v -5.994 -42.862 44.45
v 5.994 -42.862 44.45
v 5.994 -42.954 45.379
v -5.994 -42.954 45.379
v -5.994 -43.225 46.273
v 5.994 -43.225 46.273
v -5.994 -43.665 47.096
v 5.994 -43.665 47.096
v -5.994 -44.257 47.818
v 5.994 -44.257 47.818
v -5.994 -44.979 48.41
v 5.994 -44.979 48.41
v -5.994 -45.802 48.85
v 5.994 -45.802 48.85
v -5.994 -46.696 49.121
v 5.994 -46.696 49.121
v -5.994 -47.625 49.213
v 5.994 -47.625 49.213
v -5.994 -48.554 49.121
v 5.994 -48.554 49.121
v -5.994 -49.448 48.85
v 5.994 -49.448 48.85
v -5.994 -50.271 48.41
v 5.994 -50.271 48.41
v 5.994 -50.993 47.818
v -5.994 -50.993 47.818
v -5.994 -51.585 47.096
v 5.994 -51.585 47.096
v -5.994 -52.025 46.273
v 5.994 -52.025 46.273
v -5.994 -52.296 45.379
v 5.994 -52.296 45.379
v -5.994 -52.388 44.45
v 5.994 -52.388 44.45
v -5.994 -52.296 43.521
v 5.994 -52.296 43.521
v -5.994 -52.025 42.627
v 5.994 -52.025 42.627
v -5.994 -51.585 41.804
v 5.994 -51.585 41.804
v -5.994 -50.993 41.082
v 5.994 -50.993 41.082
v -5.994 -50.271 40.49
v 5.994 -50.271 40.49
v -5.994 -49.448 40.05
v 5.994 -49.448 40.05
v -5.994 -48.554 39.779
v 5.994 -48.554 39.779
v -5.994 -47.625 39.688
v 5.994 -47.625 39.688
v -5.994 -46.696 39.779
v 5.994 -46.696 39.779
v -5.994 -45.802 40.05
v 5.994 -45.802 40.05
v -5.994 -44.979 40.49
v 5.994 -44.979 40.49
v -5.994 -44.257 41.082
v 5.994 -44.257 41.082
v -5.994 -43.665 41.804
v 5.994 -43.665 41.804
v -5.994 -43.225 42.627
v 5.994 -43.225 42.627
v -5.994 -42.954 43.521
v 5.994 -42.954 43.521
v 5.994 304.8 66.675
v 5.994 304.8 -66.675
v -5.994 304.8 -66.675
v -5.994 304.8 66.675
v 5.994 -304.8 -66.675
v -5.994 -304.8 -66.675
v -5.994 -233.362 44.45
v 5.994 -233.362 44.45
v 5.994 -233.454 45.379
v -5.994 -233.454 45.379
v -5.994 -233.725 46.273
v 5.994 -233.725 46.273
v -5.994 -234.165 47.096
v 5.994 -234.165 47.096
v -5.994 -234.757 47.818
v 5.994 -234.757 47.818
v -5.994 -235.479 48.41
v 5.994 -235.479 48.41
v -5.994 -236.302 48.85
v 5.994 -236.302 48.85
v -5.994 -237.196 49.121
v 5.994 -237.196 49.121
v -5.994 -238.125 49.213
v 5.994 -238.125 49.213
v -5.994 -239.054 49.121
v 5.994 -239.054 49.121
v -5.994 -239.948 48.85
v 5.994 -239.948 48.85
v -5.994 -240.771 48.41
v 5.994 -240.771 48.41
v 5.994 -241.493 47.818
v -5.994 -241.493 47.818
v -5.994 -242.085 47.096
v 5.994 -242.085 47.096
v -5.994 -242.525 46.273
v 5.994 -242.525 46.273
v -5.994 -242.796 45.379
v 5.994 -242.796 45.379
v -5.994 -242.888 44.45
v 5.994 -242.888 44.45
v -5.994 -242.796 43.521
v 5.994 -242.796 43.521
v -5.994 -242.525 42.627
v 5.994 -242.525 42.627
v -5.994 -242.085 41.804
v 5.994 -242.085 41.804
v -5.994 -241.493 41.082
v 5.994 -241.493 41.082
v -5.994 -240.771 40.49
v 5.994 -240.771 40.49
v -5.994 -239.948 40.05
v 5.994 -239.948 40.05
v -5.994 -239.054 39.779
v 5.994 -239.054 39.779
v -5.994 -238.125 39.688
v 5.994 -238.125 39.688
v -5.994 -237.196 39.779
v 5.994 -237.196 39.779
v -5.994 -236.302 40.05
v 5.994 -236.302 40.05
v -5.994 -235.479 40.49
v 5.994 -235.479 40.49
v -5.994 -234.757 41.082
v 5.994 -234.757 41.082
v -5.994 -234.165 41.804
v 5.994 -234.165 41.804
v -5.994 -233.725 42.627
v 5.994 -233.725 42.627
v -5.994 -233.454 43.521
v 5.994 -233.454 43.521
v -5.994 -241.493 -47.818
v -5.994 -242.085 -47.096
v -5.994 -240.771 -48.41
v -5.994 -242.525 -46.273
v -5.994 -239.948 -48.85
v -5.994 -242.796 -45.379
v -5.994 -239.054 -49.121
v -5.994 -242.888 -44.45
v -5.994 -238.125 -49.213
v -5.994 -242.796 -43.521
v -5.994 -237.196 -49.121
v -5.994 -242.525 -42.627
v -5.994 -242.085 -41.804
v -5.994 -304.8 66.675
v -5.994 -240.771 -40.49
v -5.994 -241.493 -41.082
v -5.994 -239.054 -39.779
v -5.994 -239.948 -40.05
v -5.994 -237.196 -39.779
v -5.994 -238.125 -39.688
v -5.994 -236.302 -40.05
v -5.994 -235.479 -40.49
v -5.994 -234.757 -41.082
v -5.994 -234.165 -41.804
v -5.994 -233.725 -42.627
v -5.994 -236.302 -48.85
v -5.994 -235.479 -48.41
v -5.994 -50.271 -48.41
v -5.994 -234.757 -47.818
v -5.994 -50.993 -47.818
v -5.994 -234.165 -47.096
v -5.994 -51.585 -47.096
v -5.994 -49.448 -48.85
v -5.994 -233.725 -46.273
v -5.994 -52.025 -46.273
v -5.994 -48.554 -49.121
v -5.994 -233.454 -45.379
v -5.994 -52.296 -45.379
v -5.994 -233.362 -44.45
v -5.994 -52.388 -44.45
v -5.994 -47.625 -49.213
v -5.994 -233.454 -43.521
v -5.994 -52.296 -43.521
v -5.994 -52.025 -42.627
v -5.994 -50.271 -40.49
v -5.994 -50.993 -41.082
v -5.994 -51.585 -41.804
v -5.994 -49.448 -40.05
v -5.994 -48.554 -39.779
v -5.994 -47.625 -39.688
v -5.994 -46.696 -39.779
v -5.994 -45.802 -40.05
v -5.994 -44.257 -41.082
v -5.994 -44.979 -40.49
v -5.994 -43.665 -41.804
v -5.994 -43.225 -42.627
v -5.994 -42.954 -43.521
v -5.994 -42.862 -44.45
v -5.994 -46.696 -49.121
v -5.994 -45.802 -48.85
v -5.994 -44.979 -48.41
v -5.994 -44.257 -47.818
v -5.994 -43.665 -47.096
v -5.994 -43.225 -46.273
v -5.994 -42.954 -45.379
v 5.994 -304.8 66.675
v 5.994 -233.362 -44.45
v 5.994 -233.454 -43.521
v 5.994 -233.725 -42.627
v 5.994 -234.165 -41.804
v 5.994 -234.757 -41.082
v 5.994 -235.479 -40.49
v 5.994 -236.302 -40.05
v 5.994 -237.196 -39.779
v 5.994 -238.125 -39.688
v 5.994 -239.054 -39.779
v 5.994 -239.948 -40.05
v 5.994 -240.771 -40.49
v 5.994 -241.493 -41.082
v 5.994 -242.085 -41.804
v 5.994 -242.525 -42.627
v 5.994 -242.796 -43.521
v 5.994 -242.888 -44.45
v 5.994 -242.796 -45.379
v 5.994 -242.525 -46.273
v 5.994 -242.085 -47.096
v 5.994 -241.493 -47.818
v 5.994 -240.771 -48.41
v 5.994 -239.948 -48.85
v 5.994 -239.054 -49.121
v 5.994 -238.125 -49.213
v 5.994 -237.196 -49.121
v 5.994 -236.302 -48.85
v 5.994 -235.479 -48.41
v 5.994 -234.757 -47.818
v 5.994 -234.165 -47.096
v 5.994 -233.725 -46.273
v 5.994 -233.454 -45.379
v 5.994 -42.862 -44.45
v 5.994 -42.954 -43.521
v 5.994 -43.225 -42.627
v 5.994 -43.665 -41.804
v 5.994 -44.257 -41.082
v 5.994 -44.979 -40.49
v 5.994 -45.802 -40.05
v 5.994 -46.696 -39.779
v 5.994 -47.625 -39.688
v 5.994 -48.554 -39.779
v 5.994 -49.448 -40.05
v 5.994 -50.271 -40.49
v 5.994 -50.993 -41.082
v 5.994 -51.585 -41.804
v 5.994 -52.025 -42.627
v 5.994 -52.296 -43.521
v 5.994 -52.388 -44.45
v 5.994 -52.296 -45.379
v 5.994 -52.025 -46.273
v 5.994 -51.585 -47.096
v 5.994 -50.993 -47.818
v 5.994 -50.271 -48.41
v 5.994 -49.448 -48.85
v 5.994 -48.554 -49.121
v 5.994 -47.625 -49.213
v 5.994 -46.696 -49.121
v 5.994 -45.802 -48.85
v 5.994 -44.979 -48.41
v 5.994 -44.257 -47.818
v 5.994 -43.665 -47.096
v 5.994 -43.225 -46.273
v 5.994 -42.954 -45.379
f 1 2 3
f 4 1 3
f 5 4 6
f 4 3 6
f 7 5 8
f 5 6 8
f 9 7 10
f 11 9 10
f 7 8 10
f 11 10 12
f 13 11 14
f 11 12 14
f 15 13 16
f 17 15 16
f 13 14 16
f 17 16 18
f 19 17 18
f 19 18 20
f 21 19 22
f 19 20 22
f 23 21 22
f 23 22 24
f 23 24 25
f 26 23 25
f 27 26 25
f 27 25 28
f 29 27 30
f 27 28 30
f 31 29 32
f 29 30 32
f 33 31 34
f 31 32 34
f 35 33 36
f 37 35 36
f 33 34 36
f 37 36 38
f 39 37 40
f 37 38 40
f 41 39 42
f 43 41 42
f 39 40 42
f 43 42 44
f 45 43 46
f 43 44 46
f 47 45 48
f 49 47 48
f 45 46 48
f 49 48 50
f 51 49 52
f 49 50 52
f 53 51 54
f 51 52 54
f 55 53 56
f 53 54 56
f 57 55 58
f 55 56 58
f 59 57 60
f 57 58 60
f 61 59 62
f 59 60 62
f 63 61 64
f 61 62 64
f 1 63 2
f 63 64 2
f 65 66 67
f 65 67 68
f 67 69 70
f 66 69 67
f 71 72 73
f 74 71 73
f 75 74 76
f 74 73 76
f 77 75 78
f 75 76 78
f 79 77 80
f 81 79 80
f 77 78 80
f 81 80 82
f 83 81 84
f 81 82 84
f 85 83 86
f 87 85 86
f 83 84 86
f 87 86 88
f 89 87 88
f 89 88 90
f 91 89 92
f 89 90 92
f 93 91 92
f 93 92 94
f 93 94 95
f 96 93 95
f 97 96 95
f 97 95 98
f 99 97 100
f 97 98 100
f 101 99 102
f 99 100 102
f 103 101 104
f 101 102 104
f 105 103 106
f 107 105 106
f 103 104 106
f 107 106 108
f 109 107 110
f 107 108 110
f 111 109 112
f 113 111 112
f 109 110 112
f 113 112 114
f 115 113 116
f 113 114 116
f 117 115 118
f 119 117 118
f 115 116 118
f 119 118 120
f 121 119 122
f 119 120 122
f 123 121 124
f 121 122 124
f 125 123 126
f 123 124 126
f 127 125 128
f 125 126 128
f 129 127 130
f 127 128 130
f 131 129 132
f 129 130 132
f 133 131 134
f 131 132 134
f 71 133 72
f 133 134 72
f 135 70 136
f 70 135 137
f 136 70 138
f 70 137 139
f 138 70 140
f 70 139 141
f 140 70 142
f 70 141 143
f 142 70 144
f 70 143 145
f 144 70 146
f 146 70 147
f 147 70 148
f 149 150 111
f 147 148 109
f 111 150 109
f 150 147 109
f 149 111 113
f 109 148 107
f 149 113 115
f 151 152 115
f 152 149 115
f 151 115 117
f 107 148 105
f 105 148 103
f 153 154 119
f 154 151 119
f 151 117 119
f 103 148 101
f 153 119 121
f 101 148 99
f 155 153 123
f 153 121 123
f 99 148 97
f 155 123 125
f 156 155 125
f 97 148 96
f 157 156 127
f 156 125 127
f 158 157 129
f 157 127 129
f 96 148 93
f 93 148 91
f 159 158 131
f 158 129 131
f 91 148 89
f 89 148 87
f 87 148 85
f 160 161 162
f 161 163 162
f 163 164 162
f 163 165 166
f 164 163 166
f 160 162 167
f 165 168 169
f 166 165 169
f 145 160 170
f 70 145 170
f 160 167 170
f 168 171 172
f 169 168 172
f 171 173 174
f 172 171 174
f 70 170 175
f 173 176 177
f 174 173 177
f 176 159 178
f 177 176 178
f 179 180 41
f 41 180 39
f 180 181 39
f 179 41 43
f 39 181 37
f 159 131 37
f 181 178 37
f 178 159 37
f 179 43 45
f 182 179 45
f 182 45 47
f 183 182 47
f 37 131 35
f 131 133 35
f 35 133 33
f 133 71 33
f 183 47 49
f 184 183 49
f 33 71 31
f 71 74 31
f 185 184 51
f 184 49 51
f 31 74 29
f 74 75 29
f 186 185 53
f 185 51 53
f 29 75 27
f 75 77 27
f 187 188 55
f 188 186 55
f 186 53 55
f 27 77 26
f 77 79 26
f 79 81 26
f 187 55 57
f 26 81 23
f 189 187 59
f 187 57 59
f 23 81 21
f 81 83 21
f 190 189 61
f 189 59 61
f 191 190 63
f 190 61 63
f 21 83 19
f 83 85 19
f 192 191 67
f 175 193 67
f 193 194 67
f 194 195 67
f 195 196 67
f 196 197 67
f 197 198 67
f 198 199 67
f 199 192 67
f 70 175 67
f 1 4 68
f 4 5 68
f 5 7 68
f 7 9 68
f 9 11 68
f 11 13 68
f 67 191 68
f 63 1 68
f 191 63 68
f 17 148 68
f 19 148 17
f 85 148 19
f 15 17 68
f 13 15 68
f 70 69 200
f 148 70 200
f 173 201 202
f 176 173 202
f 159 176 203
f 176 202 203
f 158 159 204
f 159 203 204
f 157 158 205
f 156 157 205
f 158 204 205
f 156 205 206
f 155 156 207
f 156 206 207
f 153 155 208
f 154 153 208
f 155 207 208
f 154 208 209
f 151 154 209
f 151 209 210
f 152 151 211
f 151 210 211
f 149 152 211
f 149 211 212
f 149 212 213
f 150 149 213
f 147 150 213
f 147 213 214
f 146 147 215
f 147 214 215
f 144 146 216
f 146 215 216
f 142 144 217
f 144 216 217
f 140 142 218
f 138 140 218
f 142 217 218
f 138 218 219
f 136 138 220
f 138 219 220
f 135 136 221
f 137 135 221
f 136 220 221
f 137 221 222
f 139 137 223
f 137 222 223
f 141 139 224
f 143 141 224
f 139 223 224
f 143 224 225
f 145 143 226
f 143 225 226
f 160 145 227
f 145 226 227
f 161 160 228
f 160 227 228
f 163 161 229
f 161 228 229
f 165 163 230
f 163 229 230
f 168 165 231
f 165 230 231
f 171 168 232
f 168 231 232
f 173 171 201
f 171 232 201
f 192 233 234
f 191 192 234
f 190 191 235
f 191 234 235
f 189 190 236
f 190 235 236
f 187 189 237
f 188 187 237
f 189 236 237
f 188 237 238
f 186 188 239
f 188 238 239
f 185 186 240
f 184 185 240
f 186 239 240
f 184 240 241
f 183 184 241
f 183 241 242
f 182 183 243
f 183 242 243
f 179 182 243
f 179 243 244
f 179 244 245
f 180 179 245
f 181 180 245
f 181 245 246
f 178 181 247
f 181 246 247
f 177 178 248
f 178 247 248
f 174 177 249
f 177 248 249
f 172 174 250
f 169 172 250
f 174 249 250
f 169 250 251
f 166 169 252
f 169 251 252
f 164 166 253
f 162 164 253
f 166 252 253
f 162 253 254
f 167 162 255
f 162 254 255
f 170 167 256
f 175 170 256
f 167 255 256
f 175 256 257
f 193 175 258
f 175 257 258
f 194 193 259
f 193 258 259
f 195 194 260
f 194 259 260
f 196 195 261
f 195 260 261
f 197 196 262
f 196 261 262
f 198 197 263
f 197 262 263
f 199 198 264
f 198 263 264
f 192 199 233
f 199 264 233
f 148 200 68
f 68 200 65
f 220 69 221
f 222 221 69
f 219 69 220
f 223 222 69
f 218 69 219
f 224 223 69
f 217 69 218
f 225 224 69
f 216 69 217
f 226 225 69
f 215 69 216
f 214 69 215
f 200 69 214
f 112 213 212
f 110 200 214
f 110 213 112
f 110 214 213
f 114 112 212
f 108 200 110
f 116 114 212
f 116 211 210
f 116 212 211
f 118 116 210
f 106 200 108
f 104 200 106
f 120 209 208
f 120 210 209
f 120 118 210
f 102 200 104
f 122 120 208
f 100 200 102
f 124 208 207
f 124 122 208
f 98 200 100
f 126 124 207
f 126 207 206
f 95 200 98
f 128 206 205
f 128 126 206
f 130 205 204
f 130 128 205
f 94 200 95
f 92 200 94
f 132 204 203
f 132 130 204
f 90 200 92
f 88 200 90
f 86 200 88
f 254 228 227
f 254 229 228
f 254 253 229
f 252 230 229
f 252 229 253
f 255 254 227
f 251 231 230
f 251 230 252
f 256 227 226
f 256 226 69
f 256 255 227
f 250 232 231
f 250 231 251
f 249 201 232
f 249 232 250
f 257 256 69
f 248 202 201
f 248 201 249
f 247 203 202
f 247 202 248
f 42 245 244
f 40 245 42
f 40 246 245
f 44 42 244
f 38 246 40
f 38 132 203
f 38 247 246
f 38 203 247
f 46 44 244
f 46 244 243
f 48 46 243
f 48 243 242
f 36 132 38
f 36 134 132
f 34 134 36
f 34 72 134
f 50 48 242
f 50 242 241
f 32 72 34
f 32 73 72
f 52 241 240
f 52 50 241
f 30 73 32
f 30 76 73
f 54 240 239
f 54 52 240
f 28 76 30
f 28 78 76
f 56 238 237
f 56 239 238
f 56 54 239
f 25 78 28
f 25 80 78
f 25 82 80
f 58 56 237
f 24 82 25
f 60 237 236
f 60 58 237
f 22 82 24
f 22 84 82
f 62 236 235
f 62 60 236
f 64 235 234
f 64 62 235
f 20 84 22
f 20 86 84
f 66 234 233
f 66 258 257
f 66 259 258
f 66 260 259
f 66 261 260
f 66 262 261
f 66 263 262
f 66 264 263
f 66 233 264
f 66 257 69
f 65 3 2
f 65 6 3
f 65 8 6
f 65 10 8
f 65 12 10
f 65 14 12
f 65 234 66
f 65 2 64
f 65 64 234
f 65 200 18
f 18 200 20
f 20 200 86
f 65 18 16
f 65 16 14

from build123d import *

# Parameters (mm, degrees)
F0_W     = 609.6
F0_H     = 133.35
F1_DEPTH = 5.9944
F2_R     = 4.7625
F3_DEPTH = 11.9888


with BuildPart() as f1:
    # F0 (on Right) → F1 (new body, symmetric)
    with BuildSketch(Plane.YZ):
        Rectangle(F0_W, F0_H)
    extrude(amount=F1_DEPTH, both=True)

    # F2 (on face) → F3 (cut, through all)
    with BuildSketch(Plane.YZ.offset(5.9944)):
        with Locations((-238.125, -44.45)):
            Circle(F2_R)
        with Locations((-47.625, -44.45)):
            Circle(F2_R)
        with Locations((-47.625, 44.45)):
            Circle(F2_R)
        with Locations((-238.125, 44.45)):
            Circle(F2_R)
    extrude(amount=-F3_DEPTH, mode=Mode.SUBTRACT)


solid = f1.part
